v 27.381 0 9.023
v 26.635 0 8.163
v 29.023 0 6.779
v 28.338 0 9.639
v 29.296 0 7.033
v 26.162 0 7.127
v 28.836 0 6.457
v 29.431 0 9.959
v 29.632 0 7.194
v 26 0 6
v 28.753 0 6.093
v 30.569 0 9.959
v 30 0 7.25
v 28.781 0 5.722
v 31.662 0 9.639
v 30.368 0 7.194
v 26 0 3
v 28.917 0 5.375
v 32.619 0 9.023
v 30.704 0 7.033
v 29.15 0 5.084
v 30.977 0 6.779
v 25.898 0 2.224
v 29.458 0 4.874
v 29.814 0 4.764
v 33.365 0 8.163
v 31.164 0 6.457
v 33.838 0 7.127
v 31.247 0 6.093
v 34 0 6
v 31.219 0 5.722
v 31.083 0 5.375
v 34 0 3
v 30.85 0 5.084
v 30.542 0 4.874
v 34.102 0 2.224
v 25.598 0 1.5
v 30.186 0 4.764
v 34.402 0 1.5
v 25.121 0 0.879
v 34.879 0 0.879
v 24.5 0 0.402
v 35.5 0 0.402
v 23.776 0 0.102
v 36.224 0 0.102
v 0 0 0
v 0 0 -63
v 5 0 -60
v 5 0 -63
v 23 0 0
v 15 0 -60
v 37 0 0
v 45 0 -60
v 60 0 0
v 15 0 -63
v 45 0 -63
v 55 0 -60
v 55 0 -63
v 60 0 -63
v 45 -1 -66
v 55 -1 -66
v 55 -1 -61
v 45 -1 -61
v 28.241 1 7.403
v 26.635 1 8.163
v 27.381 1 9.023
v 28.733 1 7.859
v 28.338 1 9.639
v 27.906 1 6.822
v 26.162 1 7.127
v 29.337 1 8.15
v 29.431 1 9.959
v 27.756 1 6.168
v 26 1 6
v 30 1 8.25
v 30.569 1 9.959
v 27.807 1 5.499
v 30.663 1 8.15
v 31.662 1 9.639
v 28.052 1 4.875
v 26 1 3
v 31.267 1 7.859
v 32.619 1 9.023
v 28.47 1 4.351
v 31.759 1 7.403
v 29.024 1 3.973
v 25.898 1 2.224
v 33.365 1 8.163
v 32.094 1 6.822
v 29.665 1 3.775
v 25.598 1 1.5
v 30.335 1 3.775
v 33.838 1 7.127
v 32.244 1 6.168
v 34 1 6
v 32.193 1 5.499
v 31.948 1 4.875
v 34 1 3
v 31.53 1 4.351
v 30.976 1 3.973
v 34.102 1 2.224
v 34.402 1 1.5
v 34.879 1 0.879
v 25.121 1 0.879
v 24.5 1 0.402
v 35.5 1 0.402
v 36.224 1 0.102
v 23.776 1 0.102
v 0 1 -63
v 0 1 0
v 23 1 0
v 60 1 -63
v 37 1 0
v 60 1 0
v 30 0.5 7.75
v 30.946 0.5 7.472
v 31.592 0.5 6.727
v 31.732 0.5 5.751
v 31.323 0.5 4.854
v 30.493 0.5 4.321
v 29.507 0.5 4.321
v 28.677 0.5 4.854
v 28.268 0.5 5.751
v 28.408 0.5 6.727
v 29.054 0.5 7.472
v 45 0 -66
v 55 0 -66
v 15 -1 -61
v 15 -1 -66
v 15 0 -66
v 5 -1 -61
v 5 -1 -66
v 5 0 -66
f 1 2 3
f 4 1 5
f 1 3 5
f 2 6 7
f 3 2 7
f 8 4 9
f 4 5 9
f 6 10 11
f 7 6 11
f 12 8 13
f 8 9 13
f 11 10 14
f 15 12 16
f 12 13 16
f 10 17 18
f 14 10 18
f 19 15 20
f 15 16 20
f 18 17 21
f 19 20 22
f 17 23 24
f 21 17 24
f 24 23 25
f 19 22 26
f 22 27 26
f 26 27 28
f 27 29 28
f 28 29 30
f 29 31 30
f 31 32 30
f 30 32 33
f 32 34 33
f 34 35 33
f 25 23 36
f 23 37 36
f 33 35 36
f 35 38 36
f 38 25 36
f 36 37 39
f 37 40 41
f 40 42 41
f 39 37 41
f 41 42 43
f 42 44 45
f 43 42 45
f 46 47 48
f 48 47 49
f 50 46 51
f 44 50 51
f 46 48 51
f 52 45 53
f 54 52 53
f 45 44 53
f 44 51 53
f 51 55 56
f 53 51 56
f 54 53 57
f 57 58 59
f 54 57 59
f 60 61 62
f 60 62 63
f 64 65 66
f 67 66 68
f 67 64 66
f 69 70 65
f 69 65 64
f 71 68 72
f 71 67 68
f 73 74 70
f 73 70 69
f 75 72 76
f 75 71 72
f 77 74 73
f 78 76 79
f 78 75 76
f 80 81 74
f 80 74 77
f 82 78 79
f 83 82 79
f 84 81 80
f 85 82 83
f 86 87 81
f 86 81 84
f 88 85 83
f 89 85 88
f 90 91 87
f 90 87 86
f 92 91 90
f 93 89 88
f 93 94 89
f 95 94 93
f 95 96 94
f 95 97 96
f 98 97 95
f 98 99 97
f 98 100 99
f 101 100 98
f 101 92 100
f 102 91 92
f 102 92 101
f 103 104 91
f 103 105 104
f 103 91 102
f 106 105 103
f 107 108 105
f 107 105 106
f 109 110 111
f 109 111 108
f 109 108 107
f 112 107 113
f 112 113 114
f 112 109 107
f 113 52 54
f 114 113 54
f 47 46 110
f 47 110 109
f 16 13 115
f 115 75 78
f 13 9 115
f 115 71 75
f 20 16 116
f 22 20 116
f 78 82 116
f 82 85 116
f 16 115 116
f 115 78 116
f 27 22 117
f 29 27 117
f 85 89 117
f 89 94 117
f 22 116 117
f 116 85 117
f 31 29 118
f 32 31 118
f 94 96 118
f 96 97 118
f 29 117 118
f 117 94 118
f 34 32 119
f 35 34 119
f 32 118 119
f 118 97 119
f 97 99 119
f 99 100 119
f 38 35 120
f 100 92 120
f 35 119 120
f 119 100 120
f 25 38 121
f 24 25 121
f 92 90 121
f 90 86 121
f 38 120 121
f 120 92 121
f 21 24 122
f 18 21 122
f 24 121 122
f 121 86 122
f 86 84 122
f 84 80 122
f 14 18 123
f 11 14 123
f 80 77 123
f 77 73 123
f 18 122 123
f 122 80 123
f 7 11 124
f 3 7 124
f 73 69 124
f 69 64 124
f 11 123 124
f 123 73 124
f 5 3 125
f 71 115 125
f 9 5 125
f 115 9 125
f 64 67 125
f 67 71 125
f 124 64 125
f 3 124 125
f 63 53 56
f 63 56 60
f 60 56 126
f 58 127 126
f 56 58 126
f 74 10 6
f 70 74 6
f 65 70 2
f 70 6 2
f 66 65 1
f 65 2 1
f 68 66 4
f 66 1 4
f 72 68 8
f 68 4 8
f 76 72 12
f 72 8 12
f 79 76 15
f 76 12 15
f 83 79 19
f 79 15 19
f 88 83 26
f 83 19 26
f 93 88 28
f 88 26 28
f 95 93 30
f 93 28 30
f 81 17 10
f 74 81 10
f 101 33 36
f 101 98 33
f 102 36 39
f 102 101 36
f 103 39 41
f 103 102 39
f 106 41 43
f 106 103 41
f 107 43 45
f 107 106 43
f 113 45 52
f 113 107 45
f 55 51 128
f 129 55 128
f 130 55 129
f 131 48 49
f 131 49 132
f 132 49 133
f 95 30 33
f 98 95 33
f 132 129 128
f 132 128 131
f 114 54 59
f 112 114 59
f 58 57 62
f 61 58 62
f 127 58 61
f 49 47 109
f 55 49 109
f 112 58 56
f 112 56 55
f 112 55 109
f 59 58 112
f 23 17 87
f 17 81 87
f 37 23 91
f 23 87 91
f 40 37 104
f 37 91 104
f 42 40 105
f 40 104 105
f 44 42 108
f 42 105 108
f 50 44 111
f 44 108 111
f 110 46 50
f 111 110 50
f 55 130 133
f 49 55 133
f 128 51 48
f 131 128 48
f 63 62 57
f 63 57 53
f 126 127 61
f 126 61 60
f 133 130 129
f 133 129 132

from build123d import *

# Parameters (mm, degrees)
SKETCH1_W           = 60
SKETCH1_H           = 63
SKETCH1_R           = 4
SKETCH1_R_2         = 1.25
BOSS_EXTRUDE1_DEPTH = 1
FILLET1_R           = 3
SKETCH2_W           = 10
SKETCH2_H           = 5
BOSS_EXTRUDE2_DEPTH = 1
CHAMFER1_SIZE       = 1
CHAMFER2_SIZE       = 1


with BuildPart() as part:
    # Sketch1 → Boss-Extrude1 (new body)
    # profile 1 of 3: a face of its own
    with BuildSketch(Plane(origin=(0, 0, 0), x_dir=(1, 0, 0), z_dir=(0, 1, 0))):
        with Locations((30, 31.5)):
            Rectangle(SKETCH1_W, SKETCH1_H)
    # profile 2 of 3: a face of its own
    with BuildSketch(Plane(origin=(0, 0, 0), x_dir=(1, 0, 0), z_dir=(0, 1, 0))):
        with BuildLine():
            Line((26, 0), (26, -6))
            ThreePointArc((26, -6), (30, -2), (34, -6))
            Line((34, -6), (34, 0))
            Line((34, 0), (26, 0))
        make_face()
    # profile 3 of 3: a face of its own
    with BuildSketch(Plane(origin=(0, 0, 0), x_dir=(1, 0, 0), z_dir=(0, 1, 0))):
        with Locations((30, -6)):
            Circle(SKETCH1_R)
        with Locations(Location((30, -6, 0), (0, 0, 270))):
            Circle(SKETCH1_R_2, mode=Mode.SUBTRACT)
    extrude(amount=BOSS_EXTRUDE1_DEPTH)

    # Fillet1
    fillet1_edges = [part.edges().sort_by_distance(p)[0] for p in [
        (34, 0.5, 0),
        (26, 0.5, 0),
    ]]
    fillet(fillet1_edges, radius=FILLET1_R)

    # Sketch2 → Boss-Extrude2 (add)
    with BuildSketch(Plane(origin=(0, 0, 0), x_dir=(-1, 0, 0), z_dir=(0, -1, 0))):
        with Locations((-10, 63.5)):
            Rectangle(SKETCH2_W, SKETCH2_H)
        with Locations((-50, 63.5)):
            Rectangle(SKETCH2_W, SKETCH2_H)
    extrude(amount=BOSS_EXTRUDE2_DEPTH)

    # Chamfer1
    chamfer1_edges = [part.edges().sort_by_distance(p)[0] for p in [
        (50, 0, -61),
        (10, 0, -61),
    ]]
    chamfer(chamfer1_edges, length=CHAMFER1_SIZE - 0.0001)  # a hair under: the kernel refuses the full size

    # Chamfer2
    chamfer2_edges = [part.edges().sort_by_distance(p)[0] for p in [
        (30, 1, 4.75),
    ]]
    chamfer(chamfer2_edges, length=CHAMFER2_SIZE - 0.0001)  # a hair under: the kernel refuses the full size


solid = part.part
